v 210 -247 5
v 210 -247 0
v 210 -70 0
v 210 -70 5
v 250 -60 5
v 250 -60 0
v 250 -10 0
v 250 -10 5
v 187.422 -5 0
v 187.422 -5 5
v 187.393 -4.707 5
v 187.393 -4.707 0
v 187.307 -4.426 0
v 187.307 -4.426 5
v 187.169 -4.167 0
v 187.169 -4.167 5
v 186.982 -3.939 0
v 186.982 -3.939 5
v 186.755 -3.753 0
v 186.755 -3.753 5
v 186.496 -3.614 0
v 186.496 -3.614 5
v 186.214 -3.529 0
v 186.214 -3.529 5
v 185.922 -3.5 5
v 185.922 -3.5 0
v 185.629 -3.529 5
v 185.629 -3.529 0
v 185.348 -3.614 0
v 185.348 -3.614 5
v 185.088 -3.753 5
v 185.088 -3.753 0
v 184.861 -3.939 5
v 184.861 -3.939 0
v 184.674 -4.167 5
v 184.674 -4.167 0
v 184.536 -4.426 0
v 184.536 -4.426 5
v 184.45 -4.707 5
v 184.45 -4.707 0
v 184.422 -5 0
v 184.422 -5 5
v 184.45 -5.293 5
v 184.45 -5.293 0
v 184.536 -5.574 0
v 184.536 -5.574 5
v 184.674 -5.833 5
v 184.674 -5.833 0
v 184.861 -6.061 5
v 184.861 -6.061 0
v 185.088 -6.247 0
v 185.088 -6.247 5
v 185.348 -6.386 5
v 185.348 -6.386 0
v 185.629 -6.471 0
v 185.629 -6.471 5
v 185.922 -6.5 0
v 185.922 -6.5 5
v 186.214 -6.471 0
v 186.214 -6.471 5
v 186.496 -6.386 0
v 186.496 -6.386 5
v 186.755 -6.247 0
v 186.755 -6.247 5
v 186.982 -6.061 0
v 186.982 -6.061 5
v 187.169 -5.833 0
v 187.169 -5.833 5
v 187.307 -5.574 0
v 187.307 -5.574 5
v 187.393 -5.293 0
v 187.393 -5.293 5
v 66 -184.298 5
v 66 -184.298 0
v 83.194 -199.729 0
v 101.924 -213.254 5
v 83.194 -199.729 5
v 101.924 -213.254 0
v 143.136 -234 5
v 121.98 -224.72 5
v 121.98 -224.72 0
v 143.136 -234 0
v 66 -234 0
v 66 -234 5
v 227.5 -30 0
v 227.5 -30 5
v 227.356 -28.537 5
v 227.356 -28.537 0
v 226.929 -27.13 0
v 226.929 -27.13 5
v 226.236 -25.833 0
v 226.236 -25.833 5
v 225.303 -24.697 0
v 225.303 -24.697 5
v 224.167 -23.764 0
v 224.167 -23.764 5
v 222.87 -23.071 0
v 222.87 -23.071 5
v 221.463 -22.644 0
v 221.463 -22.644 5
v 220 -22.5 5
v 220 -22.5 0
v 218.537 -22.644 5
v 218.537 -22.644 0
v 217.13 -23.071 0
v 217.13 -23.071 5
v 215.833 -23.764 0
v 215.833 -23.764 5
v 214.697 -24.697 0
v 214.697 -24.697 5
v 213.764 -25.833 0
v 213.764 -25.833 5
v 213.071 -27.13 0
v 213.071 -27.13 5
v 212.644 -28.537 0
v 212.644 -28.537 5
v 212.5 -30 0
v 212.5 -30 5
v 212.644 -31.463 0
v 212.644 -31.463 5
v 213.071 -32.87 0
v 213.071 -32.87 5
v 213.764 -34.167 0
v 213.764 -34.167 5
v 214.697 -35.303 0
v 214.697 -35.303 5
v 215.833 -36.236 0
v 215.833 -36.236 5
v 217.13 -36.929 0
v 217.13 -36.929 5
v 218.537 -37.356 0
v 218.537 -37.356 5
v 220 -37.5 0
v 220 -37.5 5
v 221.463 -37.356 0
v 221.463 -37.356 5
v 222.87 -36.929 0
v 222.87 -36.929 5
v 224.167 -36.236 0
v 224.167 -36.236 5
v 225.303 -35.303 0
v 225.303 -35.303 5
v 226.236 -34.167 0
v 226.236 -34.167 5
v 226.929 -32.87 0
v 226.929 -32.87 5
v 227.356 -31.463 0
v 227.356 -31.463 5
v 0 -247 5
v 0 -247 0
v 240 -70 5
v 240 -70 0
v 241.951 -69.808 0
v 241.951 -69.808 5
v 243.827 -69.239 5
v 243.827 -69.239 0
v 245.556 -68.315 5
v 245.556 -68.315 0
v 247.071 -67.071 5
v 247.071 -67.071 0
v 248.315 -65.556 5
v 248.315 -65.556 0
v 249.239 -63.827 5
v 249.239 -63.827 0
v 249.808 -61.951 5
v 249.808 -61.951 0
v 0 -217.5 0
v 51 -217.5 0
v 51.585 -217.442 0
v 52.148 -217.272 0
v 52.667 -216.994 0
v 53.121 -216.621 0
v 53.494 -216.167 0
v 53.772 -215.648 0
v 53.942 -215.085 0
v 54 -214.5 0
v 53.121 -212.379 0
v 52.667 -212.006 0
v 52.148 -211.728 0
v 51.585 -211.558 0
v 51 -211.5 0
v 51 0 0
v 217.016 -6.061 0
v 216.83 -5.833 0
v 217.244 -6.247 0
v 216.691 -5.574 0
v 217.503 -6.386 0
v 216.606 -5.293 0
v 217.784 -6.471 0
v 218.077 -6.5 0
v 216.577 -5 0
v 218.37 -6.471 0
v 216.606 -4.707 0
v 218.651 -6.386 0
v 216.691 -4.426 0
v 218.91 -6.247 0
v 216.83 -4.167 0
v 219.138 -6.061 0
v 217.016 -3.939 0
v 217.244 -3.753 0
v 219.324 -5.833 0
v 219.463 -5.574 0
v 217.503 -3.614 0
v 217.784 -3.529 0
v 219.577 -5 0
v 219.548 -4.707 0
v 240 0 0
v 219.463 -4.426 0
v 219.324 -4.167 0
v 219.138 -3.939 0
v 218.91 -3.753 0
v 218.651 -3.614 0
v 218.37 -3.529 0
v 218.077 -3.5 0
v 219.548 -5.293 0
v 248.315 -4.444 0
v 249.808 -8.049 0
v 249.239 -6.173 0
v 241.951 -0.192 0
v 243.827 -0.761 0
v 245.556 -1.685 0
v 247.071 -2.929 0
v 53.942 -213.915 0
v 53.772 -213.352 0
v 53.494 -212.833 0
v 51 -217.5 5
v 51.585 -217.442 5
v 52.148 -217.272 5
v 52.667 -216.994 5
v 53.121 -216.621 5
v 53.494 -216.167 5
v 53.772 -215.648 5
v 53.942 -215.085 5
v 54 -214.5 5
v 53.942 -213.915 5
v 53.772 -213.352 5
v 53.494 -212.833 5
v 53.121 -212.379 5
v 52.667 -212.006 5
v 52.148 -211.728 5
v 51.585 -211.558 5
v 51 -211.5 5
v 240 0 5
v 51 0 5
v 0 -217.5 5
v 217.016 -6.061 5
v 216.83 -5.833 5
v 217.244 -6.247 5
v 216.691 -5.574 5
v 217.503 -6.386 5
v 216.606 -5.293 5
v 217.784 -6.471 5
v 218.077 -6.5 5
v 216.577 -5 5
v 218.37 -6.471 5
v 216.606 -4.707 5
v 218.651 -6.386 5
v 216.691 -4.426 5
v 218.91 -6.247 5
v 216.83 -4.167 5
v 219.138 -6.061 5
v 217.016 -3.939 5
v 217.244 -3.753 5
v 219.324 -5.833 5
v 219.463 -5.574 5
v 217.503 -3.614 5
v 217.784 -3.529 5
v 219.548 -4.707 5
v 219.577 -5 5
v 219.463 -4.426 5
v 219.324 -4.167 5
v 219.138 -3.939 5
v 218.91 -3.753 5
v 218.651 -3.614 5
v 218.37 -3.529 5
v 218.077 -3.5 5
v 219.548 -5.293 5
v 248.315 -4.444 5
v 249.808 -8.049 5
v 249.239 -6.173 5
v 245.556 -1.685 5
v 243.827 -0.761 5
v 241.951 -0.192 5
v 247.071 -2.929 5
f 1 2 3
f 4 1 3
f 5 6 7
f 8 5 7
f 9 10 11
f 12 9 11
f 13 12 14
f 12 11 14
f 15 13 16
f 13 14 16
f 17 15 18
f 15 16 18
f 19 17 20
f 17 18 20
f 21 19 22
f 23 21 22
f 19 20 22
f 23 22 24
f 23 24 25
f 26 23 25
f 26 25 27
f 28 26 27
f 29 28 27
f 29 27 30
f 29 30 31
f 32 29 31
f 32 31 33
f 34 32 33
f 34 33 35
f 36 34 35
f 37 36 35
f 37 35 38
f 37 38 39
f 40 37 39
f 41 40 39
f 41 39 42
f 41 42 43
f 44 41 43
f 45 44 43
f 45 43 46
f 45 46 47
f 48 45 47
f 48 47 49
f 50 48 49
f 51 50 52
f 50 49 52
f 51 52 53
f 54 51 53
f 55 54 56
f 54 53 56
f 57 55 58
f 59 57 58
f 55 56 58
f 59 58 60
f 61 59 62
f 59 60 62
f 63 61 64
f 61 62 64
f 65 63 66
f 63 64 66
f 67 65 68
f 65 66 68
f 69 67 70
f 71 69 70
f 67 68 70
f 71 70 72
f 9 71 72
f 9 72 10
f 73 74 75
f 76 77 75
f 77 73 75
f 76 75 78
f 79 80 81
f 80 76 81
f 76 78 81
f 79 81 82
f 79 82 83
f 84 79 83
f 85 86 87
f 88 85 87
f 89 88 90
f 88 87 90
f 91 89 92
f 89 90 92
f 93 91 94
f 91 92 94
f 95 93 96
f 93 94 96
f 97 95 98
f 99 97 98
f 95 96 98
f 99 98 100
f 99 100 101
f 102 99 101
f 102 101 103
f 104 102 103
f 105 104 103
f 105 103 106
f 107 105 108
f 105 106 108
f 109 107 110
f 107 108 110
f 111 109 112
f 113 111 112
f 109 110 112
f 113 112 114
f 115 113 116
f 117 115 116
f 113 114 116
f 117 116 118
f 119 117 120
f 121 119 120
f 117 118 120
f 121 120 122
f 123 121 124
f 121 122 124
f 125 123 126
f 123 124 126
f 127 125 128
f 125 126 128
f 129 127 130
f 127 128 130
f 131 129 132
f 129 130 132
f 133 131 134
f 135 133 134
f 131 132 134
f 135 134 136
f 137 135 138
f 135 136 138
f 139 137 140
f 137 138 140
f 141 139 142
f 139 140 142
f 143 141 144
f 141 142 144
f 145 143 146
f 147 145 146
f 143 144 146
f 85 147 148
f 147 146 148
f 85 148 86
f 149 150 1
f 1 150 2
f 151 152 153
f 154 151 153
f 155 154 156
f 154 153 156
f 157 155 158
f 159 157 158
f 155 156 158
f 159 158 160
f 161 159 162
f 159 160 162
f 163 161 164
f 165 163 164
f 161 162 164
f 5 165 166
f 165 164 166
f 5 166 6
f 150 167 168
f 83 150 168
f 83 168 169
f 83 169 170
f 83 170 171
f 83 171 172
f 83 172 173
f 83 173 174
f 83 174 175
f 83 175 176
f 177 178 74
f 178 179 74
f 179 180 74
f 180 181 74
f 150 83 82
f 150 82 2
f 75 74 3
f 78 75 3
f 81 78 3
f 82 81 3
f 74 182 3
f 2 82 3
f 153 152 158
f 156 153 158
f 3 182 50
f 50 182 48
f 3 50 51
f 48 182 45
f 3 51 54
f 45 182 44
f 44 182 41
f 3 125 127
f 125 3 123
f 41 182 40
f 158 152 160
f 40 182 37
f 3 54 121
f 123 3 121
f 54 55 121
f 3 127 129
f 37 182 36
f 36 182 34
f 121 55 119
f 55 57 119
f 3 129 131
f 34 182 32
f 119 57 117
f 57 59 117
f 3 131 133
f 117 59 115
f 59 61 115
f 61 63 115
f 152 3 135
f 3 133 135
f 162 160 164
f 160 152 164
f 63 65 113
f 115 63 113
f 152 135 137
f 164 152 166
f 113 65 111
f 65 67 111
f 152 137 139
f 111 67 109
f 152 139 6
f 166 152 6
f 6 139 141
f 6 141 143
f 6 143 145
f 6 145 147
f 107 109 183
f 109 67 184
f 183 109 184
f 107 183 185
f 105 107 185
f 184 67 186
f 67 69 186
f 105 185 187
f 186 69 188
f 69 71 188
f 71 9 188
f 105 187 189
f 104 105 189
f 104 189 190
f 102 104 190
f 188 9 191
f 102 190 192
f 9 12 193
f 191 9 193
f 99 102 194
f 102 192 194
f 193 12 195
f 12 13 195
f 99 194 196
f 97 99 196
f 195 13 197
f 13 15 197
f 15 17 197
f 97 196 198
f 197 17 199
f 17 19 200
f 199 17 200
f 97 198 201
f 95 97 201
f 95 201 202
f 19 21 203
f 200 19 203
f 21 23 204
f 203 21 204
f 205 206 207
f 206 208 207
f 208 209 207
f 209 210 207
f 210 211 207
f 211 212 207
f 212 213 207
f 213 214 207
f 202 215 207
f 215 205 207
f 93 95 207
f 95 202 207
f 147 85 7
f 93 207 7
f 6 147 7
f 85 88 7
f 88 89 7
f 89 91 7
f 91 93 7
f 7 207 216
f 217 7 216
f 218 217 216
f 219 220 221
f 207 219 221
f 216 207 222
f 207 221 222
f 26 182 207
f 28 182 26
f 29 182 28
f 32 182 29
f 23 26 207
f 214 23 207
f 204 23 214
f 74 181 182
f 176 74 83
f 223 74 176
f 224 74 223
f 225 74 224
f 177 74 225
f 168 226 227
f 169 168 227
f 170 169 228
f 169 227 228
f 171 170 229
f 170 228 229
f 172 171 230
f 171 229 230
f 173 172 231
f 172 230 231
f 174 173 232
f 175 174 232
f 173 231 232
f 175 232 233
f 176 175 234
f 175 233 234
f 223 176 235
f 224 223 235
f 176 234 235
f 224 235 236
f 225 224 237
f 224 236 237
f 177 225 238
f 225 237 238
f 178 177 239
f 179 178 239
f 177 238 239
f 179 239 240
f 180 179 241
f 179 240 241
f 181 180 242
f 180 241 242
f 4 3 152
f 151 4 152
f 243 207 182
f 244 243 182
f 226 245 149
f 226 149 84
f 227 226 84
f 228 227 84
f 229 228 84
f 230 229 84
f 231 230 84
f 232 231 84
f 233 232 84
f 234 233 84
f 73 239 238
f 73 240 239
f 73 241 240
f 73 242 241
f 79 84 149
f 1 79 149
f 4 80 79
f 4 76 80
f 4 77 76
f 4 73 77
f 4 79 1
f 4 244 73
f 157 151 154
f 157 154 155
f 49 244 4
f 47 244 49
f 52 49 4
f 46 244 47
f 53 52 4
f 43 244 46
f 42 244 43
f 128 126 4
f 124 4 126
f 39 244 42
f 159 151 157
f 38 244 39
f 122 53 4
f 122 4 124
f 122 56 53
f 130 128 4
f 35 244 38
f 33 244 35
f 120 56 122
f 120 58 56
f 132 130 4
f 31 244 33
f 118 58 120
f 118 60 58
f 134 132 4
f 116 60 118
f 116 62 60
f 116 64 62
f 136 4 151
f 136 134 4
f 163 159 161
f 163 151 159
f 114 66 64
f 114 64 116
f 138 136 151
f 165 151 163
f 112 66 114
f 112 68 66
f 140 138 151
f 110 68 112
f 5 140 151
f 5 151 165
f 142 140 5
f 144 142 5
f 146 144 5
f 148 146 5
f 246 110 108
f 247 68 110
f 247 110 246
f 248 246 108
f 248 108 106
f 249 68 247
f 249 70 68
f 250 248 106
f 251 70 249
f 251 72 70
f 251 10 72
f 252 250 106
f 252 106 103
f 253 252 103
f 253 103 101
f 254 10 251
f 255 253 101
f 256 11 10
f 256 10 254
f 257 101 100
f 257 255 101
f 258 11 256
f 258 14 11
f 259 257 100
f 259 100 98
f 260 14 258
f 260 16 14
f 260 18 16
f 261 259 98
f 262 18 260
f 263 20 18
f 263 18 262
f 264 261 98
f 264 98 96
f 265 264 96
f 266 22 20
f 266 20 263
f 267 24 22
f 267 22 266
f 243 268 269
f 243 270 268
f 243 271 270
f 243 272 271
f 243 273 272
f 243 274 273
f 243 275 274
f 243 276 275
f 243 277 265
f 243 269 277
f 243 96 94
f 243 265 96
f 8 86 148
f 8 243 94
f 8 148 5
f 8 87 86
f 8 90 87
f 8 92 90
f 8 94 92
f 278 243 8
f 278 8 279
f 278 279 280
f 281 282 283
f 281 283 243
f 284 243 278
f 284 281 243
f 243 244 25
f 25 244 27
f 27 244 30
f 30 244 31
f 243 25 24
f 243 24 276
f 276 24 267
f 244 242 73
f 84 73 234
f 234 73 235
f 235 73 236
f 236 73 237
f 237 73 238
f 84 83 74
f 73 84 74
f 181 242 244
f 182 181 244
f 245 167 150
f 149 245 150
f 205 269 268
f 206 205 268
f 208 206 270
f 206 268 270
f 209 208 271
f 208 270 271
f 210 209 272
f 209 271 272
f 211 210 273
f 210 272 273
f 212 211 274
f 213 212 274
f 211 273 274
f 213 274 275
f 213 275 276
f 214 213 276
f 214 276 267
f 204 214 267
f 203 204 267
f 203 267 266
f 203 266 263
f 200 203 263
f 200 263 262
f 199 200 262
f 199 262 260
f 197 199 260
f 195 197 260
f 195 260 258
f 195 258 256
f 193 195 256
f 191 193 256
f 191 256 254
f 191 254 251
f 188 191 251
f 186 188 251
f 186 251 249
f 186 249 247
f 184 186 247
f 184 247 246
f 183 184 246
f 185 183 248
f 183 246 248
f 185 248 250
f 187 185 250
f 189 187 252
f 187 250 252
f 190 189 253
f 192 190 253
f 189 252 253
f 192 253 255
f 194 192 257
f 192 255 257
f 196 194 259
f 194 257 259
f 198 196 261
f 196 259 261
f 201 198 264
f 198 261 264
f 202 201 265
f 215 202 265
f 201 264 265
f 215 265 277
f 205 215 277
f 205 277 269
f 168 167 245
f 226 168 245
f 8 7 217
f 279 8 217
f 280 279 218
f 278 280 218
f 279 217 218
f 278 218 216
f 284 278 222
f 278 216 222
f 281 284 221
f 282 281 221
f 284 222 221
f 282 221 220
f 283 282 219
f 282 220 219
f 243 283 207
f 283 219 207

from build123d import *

# Parameters (mm, degrees)
EXTRUDE_1_DEPTH     = 5
SKETCH_2_R          = 7.5
CUT_EXTRUDE_1_DEPTH = 5
SKETCH_3_W          = 5
SKETCH_3_H          = 6
CUT_EXTRUDE_3_DEPTH = 51
CUT_EXTRUDE_4_REACH = 353.474
CUT_EXTRUDE_6_REACH = 353.474
SKETCH_6_R          = 1.5
CUT_EXTRUDE_7_REACH = 353.474
SKETCH_7_W          = 51
SKETCH_7_H          = 217.5
CUT_EXTRUDE_9_DEPTH = 10


with BuildPart() as part:
    # 草图1 → 凸台-拉伸1 (new body)
    with BuildSketch(Plane.XY):
        with BuildLine():
            Line((210, -247), (210, -237))
            Line((210, -237), (210, -70))
            Line((210, -70), (210, 0))
            Line((210, 0), (10, 0))
            ThreePointArc((10, 0), (2.928932188, -2.928932188), (0, -10))
            Line((0, -10), (0, -237))
            Line((0, -237), (0, -247))
            Line((0, -247), (10, -247))
            Line((10, -247), (200, -247))
            Line((200, -247), (210, -247))
        make_face()
        with BuildLine():
            Line((210, 0), (210, -70))
            Line((210, -70), (240, -70))
            ThreePointArc((240, -70), (247.071067812, -67.071067812), (250, -60))
            Line((250, -60), (250, -10))
            ThreePointArc((250, -10), (247.071067812, -2.928932188), (240, 0))
            Line((240, 0), (210, 0))
        make_face()
    extrude(amount=EXTRUDE_1_DEPTH)

    # 草图2 → 切除-拉伸1 (cut)
    with BuildSketch(Plane.XY.offset(5)):
        with Locations((220, -30)):
            Circle(SKETCH_2_R)
    extrude(amount=-CUT_EXTRUDE_1_DEPTH, mode=Mode.SUBTRACT)

    # 草图3 → 切除-拉伸3 (cut)
    with BuildSketch(Plane.ZY):
        with Locations((2.5, -214.5)):
            Rectangle(SKETCH_3_W, SKETCH_3_H)
    extrude(amount=-CUT_EXTRUDE_3_DEPTH, mode=Mode.SUBTRACT)

    # 草图4 → 切除-拉伸4 (cut, up to next)
    with BuildSketch(Plane.XY.offset(5), mode=Mode.PRIVATE) as cut_extrude_4_sk1:
        with BuildLine():
            Line((51, -211.5), (51, -217.5))
            ThreePointArc((51, -217.5), (54, -214.5), (51, -211.5))
        make_face()
    cut_extrude_4_tool1 = extrude(cut_extrude_4_sk1.sketch, amount=-CUT_EXTRUDE_4_REACH, mode=Mode.PRIVATE) & part.part
    add(cut_extrude_4_tool1.solids().sort_by_distance((52.27324, -214.5, 5))[0], mode=Mode.SUBTRACT)

    # 草图6 → 切除-拉伸6 (cut, up to next)
    with BuildSketch(Plane.XY.offset(5), mode=Mode.PRIVATE) as cut_extrude_6_sk1:
        with Locations((218.076993274, -5)):
            Circle(SKETCH_6_R)
    cut_extrude_6_tool1 = extrude(cut_extrude_6_sk1.sketch, amount=-CUT_EXTRUDE_6_REACH, mode=Mode.PRIVATE) & part.part
    # 草图6 → 切除-拉伸6 (cut, up to next)
    with BuildSketch(Plane.XY.offset(5), mode=Mode.PRIVATE) as cut_extrude_6_sk2:
        with Locations((185.921620837, -5)):
            Circle(SKETCH_6_R)
    cut_extrude_6_tool2 = extrude(cut_extrude_6_sk2.sketch, amount=-CUT_EXTRUDE_6_REACH, mode=Mode.PRIVATE) & part.part
    add(cut_extrude_6_tool1.solids().sort_by_distance((218.076993, -5, 5))[0], mode=Mode.SUBTRACT)
    add(cut_extrude_6_tool2.solids().sort_by_distance((185.921621, -5, 5))[0], mode=Mode.SUBTRACT)

    # 草图7 → 切除-拉伸7 (cut, up to next)
    with BuildSketch(Plane.XY.offset(5), mode=Mode.PRIVATE) as cut_extrude_7_sk1:
        with Locations((25.5, -108.75)):
            Rectangle(SKETCH_7_W, SKETCH_7_H)
    cut_extrude_7_tool1 = extrude(cut_extrude_7_sk1.sketch, amount=-CUT_EXTRUDE_7_REACH, mode=Mode.PRIVATE) & part.part
    add(cut_extrude_7_tool1.solids().sort_by_distance((25.5, -108.75, 5))[0], mode=Mode.SUBTRACT)

    # 草图8 → 切除-拉伸9 (cut)
    with BuildSketch(Plane(origin=(0, 0, 0), x_dir=(-1, 0, 0), z_dir=(0, 0, -1))):
        with BuildLine():
            Line((-66, -234), (-66, -184.298412176))
            ThreePointArc((-66, -184.298412176), (-101.923530523, -213.253778558), (-143.136484598, -234))
            Line((-143.136484598, -234), (-66, -234))
        make_face()
    extrude(amount=-CUT_EXTRUDE_9_DEPTH, mode=Mode.SUBTRACT)


solid = part.part
